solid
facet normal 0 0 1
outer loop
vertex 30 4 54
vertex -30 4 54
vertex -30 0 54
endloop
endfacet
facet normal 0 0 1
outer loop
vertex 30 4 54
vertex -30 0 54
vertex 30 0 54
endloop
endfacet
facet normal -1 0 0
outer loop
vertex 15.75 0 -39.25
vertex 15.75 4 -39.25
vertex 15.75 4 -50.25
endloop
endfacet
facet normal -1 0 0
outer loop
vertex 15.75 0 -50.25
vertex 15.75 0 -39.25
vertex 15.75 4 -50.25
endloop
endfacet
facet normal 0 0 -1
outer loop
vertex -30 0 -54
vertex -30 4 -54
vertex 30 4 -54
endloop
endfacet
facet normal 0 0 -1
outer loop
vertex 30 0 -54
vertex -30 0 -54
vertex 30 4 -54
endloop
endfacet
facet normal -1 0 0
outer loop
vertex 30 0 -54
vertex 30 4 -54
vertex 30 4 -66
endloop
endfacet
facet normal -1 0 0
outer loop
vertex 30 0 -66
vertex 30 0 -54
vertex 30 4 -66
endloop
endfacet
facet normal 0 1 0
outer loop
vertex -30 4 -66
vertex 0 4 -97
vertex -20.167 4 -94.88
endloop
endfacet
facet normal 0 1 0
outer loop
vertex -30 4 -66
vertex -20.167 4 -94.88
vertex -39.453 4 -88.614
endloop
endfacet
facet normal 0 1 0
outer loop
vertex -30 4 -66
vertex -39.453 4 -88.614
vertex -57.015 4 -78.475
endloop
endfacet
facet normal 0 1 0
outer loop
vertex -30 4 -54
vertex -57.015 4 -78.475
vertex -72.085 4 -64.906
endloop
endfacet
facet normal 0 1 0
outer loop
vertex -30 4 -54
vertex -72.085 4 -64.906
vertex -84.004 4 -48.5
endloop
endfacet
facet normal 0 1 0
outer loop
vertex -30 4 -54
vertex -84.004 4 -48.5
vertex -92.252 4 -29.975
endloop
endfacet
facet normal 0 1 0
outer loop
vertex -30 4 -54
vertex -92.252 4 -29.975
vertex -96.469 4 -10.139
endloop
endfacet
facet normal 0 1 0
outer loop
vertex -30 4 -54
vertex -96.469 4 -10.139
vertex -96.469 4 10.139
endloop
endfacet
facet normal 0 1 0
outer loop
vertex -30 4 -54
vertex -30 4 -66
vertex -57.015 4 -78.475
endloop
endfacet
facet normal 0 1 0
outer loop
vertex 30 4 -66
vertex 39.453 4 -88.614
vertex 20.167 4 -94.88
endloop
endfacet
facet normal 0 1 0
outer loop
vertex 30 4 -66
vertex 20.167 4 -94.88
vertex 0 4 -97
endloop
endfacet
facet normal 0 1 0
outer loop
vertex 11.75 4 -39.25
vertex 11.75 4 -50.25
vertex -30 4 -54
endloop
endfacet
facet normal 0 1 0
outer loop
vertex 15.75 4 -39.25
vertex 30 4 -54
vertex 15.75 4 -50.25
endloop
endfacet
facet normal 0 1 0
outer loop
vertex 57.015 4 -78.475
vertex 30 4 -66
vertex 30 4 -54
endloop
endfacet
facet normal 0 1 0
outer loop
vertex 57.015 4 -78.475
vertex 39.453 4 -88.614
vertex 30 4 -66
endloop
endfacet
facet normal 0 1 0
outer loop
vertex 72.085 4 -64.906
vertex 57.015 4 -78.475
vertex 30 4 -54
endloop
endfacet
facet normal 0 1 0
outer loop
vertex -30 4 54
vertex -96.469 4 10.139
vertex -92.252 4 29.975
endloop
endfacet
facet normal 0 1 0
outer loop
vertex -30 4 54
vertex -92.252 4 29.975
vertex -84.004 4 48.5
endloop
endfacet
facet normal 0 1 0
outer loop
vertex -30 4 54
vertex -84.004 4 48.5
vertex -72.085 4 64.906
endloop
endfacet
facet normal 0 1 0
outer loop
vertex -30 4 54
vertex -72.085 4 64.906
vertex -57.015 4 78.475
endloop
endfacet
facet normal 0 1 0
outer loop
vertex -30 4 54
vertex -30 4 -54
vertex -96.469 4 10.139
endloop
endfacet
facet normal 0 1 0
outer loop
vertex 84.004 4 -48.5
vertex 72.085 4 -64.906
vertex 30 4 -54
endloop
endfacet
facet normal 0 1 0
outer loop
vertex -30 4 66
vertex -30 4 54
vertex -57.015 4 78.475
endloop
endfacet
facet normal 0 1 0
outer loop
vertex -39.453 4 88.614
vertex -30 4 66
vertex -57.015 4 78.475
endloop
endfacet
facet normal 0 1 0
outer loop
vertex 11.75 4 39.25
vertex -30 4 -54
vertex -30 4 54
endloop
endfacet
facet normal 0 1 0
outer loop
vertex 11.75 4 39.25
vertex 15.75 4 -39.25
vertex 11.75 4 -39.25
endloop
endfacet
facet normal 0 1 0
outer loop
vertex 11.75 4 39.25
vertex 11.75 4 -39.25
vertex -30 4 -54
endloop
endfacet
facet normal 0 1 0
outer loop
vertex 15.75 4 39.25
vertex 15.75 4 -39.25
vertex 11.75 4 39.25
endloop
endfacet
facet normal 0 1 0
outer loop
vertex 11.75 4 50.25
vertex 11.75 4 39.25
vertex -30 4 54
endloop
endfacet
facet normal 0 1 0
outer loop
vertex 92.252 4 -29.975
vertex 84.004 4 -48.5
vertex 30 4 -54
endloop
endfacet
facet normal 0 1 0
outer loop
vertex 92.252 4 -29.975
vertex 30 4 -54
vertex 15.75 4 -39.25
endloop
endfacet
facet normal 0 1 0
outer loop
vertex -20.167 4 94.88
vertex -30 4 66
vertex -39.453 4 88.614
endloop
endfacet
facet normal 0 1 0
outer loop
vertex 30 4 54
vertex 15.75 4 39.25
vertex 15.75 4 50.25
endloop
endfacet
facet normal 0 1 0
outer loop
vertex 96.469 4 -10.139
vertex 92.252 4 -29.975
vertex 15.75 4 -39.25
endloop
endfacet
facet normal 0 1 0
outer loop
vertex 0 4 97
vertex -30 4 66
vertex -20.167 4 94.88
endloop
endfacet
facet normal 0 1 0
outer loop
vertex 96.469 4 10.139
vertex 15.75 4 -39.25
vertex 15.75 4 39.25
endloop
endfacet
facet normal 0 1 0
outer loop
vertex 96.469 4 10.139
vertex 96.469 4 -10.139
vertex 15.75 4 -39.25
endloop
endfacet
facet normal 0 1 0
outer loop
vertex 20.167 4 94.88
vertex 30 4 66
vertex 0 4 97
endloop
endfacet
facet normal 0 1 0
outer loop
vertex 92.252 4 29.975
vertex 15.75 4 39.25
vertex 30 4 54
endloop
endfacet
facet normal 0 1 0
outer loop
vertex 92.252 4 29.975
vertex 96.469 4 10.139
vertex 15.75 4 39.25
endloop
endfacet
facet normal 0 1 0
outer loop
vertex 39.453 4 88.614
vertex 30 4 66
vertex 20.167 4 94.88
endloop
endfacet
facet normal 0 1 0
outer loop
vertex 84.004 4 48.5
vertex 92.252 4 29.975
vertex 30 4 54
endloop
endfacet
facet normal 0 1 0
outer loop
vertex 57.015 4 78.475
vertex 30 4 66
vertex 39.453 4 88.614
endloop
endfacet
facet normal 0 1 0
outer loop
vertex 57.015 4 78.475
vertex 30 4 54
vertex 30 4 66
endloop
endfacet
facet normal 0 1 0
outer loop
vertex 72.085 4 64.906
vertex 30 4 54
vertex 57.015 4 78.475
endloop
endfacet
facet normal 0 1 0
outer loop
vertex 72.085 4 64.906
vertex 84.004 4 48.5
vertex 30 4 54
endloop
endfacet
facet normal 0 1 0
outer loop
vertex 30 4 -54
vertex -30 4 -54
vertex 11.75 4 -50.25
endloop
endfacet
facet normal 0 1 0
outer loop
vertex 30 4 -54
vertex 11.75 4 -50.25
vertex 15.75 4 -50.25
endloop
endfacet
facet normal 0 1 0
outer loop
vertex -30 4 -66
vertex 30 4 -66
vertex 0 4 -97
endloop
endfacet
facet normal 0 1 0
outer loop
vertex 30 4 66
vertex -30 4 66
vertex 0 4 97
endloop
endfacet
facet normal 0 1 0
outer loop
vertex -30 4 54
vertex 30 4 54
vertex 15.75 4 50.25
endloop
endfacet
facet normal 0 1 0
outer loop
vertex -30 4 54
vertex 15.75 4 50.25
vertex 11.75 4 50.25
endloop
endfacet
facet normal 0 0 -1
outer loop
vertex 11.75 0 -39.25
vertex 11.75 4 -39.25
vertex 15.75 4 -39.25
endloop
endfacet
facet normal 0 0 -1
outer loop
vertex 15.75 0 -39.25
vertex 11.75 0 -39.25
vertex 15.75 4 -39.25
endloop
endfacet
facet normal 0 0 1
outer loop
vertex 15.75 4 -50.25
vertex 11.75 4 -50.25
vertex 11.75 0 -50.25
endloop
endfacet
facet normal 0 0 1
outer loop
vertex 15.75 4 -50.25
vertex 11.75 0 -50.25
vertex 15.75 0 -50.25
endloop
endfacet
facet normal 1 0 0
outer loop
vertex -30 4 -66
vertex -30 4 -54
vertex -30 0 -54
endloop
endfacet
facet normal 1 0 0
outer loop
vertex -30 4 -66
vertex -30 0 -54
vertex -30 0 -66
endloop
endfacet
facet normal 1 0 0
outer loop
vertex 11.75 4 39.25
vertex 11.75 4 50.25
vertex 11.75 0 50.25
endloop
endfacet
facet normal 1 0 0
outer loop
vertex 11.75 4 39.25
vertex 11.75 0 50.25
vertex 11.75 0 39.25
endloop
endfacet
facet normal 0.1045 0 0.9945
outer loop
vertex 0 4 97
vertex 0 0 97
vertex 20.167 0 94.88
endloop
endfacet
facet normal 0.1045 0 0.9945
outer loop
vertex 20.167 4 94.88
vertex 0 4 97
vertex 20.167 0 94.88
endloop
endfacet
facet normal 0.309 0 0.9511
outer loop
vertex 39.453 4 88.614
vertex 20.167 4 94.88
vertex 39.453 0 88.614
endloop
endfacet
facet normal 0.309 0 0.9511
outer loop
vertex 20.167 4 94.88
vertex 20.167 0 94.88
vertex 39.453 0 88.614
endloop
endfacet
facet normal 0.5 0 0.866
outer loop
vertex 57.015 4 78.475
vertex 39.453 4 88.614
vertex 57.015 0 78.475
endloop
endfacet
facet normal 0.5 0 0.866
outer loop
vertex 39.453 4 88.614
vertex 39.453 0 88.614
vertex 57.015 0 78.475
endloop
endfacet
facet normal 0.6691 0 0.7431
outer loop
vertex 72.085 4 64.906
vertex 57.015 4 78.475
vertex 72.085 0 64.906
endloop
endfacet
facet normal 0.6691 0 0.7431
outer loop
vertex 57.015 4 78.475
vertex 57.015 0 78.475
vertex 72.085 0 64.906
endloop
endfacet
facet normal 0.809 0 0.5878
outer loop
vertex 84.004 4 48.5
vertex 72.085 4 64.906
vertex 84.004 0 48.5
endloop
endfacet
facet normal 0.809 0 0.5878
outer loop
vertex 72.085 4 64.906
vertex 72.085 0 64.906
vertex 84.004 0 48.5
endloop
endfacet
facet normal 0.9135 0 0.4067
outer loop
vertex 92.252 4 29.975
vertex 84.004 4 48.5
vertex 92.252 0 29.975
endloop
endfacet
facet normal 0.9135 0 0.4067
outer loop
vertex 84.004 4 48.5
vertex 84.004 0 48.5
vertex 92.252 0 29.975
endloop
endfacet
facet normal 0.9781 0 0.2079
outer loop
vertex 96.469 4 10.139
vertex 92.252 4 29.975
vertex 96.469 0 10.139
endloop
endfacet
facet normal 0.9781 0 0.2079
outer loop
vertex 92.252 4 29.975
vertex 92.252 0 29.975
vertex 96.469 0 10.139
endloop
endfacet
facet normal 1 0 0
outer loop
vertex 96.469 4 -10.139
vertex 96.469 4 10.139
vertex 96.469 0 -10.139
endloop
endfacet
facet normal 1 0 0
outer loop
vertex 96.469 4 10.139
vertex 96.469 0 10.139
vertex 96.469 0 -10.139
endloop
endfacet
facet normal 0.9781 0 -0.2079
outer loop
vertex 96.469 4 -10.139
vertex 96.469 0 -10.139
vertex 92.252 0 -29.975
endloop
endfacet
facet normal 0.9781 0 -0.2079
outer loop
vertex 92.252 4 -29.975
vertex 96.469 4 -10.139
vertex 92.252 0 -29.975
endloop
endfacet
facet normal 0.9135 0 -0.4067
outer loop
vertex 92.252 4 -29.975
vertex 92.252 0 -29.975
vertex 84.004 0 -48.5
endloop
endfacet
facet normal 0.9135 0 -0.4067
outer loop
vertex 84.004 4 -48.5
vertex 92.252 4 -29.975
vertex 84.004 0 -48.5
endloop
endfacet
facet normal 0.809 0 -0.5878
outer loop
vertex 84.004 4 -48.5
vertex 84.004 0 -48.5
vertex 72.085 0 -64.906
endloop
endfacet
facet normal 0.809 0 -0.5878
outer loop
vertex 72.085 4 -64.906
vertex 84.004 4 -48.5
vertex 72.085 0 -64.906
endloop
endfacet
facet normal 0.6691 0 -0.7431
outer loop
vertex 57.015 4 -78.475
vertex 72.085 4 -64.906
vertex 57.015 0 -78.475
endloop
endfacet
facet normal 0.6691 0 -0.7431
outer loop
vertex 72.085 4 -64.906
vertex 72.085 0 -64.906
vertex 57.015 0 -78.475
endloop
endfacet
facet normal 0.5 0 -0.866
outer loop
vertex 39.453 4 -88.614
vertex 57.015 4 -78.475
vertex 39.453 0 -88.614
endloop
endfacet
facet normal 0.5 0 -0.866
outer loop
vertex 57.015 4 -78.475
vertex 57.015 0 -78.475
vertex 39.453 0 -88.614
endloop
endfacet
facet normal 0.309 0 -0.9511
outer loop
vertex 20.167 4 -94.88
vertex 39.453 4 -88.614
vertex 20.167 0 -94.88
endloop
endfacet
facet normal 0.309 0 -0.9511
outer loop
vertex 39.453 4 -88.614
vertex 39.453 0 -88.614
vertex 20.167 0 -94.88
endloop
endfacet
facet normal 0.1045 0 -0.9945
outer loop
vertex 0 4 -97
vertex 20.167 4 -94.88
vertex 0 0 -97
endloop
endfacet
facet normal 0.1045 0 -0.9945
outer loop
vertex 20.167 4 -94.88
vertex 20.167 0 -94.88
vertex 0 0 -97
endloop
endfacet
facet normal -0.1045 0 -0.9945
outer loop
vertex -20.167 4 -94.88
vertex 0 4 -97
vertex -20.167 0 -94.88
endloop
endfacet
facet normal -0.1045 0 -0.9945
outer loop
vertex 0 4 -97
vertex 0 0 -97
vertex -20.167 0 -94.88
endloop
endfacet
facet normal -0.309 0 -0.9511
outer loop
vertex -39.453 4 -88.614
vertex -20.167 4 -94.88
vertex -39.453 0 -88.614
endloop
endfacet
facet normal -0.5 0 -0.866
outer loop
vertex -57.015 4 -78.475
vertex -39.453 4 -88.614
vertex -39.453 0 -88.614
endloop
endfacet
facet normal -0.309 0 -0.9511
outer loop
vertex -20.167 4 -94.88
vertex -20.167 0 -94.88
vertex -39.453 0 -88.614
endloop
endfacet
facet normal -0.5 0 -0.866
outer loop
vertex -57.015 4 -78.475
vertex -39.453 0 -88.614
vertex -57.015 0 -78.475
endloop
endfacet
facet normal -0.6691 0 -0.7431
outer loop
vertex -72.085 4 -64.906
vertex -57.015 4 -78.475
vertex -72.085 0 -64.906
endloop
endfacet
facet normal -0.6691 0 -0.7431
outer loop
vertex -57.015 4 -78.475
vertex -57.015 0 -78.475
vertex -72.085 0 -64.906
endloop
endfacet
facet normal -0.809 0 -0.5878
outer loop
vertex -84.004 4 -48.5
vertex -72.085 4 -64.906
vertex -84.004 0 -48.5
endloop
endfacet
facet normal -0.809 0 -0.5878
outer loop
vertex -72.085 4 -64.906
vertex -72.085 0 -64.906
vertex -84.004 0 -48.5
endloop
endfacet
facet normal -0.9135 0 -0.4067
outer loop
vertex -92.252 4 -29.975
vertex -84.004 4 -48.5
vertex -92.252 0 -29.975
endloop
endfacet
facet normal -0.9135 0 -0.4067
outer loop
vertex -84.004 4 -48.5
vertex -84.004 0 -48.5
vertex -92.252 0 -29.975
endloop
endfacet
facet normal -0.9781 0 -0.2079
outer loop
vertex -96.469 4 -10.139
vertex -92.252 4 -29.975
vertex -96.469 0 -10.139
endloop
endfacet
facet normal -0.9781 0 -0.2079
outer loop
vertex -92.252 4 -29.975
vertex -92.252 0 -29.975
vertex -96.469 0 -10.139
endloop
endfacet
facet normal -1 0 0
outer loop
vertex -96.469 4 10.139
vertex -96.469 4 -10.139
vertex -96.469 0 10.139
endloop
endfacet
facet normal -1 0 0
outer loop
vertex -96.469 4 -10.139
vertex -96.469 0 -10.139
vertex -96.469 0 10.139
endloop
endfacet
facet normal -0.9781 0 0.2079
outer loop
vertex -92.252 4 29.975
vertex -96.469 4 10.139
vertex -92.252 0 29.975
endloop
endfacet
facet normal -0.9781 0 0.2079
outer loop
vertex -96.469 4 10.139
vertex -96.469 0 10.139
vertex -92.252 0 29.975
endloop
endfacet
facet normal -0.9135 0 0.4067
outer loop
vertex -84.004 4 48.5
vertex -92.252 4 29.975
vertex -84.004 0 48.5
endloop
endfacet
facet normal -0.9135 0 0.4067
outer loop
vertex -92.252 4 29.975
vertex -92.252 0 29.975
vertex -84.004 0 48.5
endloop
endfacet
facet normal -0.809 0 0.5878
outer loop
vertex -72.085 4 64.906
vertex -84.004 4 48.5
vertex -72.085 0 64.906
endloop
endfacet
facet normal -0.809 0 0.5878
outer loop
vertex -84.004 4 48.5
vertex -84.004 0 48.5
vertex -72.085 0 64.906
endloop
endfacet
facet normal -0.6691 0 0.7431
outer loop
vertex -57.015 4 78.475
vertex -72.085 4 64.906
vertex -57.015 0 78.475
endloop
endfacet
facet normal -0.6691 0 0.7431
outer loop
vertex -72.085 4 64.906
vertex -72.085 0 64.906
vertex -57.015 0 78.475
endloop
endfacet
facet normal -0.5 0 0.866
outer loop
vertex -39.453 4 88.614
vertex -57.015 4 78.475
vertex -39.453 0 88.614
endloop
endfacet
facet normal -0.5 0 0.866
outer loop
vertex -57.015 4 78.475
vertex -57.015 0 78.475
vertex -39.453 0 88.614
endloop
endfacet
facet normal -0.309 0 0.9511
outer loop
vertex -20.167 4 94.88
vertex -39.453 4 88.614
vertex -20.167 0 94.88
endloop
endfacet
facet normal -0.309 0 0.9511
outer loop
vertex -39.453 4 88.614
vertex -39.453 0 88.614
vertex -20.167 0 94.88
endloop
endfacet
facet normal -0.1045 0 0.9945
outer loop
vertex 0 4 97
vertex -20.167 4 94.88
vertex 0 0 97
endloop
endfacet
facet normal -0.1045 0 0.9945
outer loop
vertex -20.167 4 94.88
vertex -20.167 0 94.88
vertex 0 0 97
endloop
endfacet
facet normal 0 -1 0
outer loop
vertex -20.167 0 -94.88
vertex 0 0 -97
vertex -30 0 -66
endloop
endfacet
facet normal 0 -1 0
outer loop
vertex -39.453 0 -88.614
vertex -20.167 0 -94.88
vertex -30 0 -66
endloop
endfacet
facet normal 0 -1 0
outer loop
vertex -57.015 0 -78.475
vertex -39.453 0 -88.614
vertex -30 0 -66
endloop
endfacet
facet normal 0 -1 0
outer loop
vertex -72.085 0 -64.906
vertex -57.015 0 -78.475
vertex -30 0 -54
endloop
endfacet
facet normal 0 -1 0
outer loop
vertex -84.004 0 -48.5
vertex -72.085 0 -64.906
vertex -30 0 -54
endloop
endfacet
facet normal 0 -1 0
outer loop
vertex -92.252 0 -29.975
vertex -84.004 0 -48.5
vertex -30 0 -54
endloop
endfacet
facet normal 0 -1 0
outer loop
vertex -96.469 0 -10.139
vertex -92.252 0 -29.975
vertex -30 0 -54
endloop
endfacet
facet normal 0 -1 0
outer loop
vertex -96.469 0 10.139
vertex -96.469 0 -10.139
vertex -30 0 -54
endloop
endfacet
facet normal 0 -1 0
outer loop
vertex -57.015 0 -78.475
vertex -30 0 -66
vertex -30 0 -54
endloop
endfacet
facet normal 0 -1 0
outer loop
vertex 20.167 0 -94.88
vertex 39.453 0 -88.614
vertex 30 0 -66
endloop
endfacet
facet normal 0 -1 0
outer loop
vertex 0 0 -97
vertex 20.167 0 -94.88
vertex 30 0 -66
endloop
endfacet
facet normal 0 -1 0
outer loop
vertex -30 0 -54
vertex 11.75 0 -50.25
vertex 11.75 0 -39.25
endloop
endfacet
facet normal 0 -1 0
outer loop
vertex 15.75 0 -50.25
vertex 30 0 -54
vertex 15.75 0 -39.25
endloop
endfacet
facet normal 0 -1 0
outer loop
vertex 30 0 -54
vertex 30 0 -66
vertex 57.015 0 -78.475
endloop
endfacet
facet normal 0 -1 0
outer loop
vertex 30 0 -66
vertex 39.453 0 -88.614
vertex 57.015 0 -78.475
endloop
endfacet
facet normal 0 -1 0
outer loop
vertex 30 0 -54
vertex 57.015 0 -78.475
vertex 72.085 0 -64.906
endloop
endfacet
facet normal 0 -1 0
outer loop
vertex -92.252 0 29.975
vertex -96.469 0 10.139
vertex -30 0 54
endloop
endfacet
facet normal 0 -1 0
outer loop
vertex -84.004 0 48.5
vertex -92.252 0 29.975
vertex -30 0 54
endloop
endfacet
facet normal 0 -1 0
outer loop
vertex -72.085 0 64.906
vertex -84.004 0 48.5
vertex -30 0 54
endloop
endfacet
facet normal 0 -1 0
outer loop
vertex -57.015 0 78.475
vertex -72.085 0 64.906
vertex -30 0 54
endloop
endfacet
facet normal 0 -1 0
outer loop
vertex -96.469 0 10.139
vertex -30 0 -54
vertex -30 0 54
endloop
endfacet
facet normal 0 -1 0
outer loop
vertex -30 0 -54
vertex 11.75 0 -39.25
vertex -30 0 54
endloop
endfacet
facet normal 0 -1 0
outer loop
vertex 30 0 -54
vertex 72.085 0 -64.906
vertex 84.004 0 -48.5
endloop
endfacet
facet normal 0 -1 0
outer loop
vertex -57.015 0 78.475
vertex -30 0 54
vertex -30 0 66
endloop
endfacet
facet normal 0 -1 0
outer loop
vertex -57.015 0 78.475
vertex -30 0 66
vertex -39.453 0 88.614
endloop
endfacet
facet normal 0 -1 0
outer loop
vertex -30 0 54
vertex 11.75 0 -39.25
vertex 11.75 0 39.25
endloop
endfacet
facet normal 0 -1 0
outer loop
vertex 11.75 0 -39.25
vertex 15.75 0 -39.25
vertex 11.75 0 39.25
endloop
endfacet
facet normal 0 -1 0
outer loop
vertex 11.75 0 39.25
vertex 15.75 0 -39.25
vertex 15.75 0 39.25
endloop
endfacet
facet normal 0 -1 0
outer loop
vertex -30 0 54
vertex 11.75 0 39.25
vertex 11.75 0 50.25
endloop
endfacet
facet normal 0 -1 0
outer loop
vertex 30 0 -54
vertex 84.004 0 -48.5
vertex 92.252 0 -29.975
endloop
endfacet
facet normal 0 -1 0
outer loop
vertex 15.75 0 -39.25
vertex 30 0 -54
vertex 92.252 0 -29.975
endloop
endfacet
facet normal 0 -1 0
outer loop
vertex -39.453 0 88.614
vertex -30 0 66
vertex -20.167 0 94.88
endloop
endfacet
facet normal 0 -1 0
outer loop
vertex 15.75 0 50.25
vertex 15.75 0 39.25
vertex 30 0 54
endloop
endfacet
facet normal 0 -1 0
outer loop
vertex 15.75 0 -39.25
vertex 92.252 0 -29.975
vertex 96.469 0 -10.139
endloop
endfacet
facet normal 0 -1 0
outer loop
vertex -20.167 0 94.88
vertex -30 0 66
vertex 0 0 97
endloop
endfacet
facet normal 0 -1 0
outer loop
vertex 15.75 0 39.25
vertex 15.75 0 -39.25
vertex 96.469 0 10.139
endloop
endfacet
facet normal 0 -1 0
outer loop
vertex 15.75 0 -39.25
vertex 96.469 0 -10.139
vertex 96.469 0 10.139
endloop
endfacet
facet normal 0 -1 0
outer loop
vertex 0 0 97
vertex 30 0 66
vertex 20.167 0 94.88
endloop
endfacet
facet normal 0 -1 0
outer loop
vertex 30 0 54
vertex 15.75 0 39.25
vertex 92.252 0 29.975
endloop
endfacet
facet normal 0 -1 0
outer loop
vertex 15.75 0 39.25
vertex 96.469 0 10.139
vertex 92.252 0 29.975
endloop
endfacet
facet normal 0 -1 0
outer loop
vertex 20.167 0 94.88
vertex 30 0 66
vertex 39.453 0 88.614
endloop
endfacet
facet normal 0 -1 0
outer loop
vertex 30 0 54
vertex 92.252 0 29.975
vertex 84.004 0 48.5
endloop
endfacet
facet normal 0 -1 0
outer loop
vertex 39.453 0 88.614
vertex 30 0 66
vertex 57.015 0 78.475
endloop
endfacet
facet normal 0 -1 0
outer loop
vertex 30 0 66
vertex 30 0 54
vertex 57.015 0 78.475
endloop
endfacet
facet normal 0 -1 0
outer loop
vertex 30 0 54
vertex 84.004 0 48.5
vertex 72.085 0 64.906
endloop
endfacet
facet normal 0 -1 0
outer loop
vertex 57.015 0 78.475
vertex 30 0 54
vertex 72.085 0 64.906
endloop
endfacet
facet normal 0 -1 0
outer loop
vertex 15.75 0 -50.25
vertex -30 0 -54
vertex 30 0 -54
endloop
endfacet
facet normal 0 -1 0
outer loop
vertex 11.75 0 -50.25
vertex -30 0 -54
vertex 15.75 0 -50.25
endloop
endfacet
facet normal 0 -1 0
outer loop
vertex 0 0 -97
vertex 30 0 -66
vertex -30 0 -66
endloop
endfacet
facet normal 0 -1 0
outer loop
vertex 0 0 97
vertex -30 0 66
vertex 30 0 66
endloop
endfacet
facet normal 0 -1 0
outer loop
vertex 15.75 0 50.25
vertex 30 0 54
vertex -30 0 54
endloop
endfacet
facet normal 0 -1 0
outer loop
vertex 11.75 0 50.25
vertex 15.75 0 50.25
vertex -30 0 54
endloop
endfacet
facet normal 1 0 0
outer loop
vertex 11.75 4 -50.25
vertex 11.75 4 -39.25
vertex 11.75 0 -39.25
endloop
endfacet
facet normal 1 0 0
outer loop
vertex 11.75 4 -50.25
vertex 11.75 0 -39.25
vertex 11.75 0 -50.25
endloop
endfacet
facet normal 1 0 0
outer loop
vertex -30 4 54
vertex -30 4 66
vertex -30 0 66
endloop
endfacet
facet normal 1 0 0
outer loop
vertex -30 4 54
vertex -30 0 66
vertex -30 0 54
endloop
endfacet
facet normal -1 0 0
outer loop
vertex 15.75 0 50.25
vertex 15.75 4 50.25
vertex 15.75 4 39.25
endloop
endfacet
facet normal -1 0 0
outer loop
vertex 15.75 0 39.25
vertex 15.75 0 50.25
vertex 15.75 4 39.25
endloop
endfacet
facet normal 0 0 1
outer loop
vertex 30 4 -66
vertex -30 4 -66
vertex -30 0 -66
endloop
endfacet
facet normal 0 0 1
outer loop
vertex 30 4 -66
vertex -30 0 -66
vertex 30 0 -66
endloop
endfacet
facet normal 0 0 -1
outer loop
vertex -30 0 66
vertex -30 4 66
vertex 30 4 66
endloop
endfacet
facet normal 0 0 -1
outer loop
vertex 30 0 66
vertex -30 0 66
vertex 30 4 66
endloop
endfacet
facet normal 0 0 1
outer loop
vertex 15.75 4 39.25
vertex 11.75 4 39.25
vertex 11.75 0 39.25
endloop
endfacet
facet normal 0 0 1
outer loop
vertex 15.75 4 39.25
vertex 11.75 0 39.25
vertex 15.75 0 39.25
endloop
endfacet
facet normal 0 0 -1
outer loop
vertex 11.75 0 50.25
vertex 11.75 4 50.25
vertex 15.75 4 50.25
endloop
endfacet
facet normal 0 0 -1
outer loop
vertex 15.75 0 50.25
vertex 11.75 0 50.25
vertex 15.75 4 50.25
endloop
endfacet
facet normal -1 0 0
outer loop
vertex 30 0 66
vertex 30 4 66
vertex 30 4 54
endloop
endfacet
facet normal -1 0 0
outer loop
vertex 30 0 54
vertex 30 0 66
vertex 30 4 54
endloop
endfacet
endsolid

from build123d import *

# Parameters (mm, degrees)
SKETCH1_R           = 97
BOSS_EXTRUDE1_DEPTH = 4
SKETCH2_W           = 60
SKETCH2_H           = 12
CUT_EXTRUDE1_DEPTH  = 10
SKETCH3_W           = 4
SKETCH3_H           = 11
CUT_EXTRUDE2_DEPTH  = 10


with BuildPart() as part:
    # Sketch1 → Boss-Extrude1 (new body)
    with BuildSketch(Plane(origin=(0, 0, 0), x_dir=(1, 0, 0), z_dir=(0, 1, 0))):
        with Locations(Location((0, 0, 0), (0, 0, 270))):  # turned: the seam where the file's is
            Circle(SKETCH1_R)
    extrude(amount=BOSS_EXTRUDE1_DEPTH)

    # Sketch2 → Cut-Extrude1 (cut)
    with BuildSketch(Plane(origin=(0, 4, 0), x_dir=(1, 0, 0), z_dir=(0, 1, 0))):
        with Locations((0, -60)):
            Rectangle(SKETCH2_W, SKETCH2_H)
        with Locations((0, 60)):
            Rectangle(SKETCH2_W, SKETCH2_H)
    extrude(amount=-CUT_EXTRUDE1_DEPTH, mode=Mode.SUBTRACT)

    # Sketch3 → Cut-Extrude2 (cut)
    with BuildSketch(Plane(origin=(0, 4, 0), x_dir=(1, 0, 0), z_dir=(0, 1, 0))):
        with Locations((13.75, -44.75)):
            Rectangle(SKETCH3_W, SKETCH3_H)
        with Locations((13.75, 44.75)):
            Rectangle(SKETCH3_W, SKETCH3_H)
    extrude(amount=-CUT_EXTRUDE2_DEPTH, mode=Mode.SUBTRACT)


solid = part.part
